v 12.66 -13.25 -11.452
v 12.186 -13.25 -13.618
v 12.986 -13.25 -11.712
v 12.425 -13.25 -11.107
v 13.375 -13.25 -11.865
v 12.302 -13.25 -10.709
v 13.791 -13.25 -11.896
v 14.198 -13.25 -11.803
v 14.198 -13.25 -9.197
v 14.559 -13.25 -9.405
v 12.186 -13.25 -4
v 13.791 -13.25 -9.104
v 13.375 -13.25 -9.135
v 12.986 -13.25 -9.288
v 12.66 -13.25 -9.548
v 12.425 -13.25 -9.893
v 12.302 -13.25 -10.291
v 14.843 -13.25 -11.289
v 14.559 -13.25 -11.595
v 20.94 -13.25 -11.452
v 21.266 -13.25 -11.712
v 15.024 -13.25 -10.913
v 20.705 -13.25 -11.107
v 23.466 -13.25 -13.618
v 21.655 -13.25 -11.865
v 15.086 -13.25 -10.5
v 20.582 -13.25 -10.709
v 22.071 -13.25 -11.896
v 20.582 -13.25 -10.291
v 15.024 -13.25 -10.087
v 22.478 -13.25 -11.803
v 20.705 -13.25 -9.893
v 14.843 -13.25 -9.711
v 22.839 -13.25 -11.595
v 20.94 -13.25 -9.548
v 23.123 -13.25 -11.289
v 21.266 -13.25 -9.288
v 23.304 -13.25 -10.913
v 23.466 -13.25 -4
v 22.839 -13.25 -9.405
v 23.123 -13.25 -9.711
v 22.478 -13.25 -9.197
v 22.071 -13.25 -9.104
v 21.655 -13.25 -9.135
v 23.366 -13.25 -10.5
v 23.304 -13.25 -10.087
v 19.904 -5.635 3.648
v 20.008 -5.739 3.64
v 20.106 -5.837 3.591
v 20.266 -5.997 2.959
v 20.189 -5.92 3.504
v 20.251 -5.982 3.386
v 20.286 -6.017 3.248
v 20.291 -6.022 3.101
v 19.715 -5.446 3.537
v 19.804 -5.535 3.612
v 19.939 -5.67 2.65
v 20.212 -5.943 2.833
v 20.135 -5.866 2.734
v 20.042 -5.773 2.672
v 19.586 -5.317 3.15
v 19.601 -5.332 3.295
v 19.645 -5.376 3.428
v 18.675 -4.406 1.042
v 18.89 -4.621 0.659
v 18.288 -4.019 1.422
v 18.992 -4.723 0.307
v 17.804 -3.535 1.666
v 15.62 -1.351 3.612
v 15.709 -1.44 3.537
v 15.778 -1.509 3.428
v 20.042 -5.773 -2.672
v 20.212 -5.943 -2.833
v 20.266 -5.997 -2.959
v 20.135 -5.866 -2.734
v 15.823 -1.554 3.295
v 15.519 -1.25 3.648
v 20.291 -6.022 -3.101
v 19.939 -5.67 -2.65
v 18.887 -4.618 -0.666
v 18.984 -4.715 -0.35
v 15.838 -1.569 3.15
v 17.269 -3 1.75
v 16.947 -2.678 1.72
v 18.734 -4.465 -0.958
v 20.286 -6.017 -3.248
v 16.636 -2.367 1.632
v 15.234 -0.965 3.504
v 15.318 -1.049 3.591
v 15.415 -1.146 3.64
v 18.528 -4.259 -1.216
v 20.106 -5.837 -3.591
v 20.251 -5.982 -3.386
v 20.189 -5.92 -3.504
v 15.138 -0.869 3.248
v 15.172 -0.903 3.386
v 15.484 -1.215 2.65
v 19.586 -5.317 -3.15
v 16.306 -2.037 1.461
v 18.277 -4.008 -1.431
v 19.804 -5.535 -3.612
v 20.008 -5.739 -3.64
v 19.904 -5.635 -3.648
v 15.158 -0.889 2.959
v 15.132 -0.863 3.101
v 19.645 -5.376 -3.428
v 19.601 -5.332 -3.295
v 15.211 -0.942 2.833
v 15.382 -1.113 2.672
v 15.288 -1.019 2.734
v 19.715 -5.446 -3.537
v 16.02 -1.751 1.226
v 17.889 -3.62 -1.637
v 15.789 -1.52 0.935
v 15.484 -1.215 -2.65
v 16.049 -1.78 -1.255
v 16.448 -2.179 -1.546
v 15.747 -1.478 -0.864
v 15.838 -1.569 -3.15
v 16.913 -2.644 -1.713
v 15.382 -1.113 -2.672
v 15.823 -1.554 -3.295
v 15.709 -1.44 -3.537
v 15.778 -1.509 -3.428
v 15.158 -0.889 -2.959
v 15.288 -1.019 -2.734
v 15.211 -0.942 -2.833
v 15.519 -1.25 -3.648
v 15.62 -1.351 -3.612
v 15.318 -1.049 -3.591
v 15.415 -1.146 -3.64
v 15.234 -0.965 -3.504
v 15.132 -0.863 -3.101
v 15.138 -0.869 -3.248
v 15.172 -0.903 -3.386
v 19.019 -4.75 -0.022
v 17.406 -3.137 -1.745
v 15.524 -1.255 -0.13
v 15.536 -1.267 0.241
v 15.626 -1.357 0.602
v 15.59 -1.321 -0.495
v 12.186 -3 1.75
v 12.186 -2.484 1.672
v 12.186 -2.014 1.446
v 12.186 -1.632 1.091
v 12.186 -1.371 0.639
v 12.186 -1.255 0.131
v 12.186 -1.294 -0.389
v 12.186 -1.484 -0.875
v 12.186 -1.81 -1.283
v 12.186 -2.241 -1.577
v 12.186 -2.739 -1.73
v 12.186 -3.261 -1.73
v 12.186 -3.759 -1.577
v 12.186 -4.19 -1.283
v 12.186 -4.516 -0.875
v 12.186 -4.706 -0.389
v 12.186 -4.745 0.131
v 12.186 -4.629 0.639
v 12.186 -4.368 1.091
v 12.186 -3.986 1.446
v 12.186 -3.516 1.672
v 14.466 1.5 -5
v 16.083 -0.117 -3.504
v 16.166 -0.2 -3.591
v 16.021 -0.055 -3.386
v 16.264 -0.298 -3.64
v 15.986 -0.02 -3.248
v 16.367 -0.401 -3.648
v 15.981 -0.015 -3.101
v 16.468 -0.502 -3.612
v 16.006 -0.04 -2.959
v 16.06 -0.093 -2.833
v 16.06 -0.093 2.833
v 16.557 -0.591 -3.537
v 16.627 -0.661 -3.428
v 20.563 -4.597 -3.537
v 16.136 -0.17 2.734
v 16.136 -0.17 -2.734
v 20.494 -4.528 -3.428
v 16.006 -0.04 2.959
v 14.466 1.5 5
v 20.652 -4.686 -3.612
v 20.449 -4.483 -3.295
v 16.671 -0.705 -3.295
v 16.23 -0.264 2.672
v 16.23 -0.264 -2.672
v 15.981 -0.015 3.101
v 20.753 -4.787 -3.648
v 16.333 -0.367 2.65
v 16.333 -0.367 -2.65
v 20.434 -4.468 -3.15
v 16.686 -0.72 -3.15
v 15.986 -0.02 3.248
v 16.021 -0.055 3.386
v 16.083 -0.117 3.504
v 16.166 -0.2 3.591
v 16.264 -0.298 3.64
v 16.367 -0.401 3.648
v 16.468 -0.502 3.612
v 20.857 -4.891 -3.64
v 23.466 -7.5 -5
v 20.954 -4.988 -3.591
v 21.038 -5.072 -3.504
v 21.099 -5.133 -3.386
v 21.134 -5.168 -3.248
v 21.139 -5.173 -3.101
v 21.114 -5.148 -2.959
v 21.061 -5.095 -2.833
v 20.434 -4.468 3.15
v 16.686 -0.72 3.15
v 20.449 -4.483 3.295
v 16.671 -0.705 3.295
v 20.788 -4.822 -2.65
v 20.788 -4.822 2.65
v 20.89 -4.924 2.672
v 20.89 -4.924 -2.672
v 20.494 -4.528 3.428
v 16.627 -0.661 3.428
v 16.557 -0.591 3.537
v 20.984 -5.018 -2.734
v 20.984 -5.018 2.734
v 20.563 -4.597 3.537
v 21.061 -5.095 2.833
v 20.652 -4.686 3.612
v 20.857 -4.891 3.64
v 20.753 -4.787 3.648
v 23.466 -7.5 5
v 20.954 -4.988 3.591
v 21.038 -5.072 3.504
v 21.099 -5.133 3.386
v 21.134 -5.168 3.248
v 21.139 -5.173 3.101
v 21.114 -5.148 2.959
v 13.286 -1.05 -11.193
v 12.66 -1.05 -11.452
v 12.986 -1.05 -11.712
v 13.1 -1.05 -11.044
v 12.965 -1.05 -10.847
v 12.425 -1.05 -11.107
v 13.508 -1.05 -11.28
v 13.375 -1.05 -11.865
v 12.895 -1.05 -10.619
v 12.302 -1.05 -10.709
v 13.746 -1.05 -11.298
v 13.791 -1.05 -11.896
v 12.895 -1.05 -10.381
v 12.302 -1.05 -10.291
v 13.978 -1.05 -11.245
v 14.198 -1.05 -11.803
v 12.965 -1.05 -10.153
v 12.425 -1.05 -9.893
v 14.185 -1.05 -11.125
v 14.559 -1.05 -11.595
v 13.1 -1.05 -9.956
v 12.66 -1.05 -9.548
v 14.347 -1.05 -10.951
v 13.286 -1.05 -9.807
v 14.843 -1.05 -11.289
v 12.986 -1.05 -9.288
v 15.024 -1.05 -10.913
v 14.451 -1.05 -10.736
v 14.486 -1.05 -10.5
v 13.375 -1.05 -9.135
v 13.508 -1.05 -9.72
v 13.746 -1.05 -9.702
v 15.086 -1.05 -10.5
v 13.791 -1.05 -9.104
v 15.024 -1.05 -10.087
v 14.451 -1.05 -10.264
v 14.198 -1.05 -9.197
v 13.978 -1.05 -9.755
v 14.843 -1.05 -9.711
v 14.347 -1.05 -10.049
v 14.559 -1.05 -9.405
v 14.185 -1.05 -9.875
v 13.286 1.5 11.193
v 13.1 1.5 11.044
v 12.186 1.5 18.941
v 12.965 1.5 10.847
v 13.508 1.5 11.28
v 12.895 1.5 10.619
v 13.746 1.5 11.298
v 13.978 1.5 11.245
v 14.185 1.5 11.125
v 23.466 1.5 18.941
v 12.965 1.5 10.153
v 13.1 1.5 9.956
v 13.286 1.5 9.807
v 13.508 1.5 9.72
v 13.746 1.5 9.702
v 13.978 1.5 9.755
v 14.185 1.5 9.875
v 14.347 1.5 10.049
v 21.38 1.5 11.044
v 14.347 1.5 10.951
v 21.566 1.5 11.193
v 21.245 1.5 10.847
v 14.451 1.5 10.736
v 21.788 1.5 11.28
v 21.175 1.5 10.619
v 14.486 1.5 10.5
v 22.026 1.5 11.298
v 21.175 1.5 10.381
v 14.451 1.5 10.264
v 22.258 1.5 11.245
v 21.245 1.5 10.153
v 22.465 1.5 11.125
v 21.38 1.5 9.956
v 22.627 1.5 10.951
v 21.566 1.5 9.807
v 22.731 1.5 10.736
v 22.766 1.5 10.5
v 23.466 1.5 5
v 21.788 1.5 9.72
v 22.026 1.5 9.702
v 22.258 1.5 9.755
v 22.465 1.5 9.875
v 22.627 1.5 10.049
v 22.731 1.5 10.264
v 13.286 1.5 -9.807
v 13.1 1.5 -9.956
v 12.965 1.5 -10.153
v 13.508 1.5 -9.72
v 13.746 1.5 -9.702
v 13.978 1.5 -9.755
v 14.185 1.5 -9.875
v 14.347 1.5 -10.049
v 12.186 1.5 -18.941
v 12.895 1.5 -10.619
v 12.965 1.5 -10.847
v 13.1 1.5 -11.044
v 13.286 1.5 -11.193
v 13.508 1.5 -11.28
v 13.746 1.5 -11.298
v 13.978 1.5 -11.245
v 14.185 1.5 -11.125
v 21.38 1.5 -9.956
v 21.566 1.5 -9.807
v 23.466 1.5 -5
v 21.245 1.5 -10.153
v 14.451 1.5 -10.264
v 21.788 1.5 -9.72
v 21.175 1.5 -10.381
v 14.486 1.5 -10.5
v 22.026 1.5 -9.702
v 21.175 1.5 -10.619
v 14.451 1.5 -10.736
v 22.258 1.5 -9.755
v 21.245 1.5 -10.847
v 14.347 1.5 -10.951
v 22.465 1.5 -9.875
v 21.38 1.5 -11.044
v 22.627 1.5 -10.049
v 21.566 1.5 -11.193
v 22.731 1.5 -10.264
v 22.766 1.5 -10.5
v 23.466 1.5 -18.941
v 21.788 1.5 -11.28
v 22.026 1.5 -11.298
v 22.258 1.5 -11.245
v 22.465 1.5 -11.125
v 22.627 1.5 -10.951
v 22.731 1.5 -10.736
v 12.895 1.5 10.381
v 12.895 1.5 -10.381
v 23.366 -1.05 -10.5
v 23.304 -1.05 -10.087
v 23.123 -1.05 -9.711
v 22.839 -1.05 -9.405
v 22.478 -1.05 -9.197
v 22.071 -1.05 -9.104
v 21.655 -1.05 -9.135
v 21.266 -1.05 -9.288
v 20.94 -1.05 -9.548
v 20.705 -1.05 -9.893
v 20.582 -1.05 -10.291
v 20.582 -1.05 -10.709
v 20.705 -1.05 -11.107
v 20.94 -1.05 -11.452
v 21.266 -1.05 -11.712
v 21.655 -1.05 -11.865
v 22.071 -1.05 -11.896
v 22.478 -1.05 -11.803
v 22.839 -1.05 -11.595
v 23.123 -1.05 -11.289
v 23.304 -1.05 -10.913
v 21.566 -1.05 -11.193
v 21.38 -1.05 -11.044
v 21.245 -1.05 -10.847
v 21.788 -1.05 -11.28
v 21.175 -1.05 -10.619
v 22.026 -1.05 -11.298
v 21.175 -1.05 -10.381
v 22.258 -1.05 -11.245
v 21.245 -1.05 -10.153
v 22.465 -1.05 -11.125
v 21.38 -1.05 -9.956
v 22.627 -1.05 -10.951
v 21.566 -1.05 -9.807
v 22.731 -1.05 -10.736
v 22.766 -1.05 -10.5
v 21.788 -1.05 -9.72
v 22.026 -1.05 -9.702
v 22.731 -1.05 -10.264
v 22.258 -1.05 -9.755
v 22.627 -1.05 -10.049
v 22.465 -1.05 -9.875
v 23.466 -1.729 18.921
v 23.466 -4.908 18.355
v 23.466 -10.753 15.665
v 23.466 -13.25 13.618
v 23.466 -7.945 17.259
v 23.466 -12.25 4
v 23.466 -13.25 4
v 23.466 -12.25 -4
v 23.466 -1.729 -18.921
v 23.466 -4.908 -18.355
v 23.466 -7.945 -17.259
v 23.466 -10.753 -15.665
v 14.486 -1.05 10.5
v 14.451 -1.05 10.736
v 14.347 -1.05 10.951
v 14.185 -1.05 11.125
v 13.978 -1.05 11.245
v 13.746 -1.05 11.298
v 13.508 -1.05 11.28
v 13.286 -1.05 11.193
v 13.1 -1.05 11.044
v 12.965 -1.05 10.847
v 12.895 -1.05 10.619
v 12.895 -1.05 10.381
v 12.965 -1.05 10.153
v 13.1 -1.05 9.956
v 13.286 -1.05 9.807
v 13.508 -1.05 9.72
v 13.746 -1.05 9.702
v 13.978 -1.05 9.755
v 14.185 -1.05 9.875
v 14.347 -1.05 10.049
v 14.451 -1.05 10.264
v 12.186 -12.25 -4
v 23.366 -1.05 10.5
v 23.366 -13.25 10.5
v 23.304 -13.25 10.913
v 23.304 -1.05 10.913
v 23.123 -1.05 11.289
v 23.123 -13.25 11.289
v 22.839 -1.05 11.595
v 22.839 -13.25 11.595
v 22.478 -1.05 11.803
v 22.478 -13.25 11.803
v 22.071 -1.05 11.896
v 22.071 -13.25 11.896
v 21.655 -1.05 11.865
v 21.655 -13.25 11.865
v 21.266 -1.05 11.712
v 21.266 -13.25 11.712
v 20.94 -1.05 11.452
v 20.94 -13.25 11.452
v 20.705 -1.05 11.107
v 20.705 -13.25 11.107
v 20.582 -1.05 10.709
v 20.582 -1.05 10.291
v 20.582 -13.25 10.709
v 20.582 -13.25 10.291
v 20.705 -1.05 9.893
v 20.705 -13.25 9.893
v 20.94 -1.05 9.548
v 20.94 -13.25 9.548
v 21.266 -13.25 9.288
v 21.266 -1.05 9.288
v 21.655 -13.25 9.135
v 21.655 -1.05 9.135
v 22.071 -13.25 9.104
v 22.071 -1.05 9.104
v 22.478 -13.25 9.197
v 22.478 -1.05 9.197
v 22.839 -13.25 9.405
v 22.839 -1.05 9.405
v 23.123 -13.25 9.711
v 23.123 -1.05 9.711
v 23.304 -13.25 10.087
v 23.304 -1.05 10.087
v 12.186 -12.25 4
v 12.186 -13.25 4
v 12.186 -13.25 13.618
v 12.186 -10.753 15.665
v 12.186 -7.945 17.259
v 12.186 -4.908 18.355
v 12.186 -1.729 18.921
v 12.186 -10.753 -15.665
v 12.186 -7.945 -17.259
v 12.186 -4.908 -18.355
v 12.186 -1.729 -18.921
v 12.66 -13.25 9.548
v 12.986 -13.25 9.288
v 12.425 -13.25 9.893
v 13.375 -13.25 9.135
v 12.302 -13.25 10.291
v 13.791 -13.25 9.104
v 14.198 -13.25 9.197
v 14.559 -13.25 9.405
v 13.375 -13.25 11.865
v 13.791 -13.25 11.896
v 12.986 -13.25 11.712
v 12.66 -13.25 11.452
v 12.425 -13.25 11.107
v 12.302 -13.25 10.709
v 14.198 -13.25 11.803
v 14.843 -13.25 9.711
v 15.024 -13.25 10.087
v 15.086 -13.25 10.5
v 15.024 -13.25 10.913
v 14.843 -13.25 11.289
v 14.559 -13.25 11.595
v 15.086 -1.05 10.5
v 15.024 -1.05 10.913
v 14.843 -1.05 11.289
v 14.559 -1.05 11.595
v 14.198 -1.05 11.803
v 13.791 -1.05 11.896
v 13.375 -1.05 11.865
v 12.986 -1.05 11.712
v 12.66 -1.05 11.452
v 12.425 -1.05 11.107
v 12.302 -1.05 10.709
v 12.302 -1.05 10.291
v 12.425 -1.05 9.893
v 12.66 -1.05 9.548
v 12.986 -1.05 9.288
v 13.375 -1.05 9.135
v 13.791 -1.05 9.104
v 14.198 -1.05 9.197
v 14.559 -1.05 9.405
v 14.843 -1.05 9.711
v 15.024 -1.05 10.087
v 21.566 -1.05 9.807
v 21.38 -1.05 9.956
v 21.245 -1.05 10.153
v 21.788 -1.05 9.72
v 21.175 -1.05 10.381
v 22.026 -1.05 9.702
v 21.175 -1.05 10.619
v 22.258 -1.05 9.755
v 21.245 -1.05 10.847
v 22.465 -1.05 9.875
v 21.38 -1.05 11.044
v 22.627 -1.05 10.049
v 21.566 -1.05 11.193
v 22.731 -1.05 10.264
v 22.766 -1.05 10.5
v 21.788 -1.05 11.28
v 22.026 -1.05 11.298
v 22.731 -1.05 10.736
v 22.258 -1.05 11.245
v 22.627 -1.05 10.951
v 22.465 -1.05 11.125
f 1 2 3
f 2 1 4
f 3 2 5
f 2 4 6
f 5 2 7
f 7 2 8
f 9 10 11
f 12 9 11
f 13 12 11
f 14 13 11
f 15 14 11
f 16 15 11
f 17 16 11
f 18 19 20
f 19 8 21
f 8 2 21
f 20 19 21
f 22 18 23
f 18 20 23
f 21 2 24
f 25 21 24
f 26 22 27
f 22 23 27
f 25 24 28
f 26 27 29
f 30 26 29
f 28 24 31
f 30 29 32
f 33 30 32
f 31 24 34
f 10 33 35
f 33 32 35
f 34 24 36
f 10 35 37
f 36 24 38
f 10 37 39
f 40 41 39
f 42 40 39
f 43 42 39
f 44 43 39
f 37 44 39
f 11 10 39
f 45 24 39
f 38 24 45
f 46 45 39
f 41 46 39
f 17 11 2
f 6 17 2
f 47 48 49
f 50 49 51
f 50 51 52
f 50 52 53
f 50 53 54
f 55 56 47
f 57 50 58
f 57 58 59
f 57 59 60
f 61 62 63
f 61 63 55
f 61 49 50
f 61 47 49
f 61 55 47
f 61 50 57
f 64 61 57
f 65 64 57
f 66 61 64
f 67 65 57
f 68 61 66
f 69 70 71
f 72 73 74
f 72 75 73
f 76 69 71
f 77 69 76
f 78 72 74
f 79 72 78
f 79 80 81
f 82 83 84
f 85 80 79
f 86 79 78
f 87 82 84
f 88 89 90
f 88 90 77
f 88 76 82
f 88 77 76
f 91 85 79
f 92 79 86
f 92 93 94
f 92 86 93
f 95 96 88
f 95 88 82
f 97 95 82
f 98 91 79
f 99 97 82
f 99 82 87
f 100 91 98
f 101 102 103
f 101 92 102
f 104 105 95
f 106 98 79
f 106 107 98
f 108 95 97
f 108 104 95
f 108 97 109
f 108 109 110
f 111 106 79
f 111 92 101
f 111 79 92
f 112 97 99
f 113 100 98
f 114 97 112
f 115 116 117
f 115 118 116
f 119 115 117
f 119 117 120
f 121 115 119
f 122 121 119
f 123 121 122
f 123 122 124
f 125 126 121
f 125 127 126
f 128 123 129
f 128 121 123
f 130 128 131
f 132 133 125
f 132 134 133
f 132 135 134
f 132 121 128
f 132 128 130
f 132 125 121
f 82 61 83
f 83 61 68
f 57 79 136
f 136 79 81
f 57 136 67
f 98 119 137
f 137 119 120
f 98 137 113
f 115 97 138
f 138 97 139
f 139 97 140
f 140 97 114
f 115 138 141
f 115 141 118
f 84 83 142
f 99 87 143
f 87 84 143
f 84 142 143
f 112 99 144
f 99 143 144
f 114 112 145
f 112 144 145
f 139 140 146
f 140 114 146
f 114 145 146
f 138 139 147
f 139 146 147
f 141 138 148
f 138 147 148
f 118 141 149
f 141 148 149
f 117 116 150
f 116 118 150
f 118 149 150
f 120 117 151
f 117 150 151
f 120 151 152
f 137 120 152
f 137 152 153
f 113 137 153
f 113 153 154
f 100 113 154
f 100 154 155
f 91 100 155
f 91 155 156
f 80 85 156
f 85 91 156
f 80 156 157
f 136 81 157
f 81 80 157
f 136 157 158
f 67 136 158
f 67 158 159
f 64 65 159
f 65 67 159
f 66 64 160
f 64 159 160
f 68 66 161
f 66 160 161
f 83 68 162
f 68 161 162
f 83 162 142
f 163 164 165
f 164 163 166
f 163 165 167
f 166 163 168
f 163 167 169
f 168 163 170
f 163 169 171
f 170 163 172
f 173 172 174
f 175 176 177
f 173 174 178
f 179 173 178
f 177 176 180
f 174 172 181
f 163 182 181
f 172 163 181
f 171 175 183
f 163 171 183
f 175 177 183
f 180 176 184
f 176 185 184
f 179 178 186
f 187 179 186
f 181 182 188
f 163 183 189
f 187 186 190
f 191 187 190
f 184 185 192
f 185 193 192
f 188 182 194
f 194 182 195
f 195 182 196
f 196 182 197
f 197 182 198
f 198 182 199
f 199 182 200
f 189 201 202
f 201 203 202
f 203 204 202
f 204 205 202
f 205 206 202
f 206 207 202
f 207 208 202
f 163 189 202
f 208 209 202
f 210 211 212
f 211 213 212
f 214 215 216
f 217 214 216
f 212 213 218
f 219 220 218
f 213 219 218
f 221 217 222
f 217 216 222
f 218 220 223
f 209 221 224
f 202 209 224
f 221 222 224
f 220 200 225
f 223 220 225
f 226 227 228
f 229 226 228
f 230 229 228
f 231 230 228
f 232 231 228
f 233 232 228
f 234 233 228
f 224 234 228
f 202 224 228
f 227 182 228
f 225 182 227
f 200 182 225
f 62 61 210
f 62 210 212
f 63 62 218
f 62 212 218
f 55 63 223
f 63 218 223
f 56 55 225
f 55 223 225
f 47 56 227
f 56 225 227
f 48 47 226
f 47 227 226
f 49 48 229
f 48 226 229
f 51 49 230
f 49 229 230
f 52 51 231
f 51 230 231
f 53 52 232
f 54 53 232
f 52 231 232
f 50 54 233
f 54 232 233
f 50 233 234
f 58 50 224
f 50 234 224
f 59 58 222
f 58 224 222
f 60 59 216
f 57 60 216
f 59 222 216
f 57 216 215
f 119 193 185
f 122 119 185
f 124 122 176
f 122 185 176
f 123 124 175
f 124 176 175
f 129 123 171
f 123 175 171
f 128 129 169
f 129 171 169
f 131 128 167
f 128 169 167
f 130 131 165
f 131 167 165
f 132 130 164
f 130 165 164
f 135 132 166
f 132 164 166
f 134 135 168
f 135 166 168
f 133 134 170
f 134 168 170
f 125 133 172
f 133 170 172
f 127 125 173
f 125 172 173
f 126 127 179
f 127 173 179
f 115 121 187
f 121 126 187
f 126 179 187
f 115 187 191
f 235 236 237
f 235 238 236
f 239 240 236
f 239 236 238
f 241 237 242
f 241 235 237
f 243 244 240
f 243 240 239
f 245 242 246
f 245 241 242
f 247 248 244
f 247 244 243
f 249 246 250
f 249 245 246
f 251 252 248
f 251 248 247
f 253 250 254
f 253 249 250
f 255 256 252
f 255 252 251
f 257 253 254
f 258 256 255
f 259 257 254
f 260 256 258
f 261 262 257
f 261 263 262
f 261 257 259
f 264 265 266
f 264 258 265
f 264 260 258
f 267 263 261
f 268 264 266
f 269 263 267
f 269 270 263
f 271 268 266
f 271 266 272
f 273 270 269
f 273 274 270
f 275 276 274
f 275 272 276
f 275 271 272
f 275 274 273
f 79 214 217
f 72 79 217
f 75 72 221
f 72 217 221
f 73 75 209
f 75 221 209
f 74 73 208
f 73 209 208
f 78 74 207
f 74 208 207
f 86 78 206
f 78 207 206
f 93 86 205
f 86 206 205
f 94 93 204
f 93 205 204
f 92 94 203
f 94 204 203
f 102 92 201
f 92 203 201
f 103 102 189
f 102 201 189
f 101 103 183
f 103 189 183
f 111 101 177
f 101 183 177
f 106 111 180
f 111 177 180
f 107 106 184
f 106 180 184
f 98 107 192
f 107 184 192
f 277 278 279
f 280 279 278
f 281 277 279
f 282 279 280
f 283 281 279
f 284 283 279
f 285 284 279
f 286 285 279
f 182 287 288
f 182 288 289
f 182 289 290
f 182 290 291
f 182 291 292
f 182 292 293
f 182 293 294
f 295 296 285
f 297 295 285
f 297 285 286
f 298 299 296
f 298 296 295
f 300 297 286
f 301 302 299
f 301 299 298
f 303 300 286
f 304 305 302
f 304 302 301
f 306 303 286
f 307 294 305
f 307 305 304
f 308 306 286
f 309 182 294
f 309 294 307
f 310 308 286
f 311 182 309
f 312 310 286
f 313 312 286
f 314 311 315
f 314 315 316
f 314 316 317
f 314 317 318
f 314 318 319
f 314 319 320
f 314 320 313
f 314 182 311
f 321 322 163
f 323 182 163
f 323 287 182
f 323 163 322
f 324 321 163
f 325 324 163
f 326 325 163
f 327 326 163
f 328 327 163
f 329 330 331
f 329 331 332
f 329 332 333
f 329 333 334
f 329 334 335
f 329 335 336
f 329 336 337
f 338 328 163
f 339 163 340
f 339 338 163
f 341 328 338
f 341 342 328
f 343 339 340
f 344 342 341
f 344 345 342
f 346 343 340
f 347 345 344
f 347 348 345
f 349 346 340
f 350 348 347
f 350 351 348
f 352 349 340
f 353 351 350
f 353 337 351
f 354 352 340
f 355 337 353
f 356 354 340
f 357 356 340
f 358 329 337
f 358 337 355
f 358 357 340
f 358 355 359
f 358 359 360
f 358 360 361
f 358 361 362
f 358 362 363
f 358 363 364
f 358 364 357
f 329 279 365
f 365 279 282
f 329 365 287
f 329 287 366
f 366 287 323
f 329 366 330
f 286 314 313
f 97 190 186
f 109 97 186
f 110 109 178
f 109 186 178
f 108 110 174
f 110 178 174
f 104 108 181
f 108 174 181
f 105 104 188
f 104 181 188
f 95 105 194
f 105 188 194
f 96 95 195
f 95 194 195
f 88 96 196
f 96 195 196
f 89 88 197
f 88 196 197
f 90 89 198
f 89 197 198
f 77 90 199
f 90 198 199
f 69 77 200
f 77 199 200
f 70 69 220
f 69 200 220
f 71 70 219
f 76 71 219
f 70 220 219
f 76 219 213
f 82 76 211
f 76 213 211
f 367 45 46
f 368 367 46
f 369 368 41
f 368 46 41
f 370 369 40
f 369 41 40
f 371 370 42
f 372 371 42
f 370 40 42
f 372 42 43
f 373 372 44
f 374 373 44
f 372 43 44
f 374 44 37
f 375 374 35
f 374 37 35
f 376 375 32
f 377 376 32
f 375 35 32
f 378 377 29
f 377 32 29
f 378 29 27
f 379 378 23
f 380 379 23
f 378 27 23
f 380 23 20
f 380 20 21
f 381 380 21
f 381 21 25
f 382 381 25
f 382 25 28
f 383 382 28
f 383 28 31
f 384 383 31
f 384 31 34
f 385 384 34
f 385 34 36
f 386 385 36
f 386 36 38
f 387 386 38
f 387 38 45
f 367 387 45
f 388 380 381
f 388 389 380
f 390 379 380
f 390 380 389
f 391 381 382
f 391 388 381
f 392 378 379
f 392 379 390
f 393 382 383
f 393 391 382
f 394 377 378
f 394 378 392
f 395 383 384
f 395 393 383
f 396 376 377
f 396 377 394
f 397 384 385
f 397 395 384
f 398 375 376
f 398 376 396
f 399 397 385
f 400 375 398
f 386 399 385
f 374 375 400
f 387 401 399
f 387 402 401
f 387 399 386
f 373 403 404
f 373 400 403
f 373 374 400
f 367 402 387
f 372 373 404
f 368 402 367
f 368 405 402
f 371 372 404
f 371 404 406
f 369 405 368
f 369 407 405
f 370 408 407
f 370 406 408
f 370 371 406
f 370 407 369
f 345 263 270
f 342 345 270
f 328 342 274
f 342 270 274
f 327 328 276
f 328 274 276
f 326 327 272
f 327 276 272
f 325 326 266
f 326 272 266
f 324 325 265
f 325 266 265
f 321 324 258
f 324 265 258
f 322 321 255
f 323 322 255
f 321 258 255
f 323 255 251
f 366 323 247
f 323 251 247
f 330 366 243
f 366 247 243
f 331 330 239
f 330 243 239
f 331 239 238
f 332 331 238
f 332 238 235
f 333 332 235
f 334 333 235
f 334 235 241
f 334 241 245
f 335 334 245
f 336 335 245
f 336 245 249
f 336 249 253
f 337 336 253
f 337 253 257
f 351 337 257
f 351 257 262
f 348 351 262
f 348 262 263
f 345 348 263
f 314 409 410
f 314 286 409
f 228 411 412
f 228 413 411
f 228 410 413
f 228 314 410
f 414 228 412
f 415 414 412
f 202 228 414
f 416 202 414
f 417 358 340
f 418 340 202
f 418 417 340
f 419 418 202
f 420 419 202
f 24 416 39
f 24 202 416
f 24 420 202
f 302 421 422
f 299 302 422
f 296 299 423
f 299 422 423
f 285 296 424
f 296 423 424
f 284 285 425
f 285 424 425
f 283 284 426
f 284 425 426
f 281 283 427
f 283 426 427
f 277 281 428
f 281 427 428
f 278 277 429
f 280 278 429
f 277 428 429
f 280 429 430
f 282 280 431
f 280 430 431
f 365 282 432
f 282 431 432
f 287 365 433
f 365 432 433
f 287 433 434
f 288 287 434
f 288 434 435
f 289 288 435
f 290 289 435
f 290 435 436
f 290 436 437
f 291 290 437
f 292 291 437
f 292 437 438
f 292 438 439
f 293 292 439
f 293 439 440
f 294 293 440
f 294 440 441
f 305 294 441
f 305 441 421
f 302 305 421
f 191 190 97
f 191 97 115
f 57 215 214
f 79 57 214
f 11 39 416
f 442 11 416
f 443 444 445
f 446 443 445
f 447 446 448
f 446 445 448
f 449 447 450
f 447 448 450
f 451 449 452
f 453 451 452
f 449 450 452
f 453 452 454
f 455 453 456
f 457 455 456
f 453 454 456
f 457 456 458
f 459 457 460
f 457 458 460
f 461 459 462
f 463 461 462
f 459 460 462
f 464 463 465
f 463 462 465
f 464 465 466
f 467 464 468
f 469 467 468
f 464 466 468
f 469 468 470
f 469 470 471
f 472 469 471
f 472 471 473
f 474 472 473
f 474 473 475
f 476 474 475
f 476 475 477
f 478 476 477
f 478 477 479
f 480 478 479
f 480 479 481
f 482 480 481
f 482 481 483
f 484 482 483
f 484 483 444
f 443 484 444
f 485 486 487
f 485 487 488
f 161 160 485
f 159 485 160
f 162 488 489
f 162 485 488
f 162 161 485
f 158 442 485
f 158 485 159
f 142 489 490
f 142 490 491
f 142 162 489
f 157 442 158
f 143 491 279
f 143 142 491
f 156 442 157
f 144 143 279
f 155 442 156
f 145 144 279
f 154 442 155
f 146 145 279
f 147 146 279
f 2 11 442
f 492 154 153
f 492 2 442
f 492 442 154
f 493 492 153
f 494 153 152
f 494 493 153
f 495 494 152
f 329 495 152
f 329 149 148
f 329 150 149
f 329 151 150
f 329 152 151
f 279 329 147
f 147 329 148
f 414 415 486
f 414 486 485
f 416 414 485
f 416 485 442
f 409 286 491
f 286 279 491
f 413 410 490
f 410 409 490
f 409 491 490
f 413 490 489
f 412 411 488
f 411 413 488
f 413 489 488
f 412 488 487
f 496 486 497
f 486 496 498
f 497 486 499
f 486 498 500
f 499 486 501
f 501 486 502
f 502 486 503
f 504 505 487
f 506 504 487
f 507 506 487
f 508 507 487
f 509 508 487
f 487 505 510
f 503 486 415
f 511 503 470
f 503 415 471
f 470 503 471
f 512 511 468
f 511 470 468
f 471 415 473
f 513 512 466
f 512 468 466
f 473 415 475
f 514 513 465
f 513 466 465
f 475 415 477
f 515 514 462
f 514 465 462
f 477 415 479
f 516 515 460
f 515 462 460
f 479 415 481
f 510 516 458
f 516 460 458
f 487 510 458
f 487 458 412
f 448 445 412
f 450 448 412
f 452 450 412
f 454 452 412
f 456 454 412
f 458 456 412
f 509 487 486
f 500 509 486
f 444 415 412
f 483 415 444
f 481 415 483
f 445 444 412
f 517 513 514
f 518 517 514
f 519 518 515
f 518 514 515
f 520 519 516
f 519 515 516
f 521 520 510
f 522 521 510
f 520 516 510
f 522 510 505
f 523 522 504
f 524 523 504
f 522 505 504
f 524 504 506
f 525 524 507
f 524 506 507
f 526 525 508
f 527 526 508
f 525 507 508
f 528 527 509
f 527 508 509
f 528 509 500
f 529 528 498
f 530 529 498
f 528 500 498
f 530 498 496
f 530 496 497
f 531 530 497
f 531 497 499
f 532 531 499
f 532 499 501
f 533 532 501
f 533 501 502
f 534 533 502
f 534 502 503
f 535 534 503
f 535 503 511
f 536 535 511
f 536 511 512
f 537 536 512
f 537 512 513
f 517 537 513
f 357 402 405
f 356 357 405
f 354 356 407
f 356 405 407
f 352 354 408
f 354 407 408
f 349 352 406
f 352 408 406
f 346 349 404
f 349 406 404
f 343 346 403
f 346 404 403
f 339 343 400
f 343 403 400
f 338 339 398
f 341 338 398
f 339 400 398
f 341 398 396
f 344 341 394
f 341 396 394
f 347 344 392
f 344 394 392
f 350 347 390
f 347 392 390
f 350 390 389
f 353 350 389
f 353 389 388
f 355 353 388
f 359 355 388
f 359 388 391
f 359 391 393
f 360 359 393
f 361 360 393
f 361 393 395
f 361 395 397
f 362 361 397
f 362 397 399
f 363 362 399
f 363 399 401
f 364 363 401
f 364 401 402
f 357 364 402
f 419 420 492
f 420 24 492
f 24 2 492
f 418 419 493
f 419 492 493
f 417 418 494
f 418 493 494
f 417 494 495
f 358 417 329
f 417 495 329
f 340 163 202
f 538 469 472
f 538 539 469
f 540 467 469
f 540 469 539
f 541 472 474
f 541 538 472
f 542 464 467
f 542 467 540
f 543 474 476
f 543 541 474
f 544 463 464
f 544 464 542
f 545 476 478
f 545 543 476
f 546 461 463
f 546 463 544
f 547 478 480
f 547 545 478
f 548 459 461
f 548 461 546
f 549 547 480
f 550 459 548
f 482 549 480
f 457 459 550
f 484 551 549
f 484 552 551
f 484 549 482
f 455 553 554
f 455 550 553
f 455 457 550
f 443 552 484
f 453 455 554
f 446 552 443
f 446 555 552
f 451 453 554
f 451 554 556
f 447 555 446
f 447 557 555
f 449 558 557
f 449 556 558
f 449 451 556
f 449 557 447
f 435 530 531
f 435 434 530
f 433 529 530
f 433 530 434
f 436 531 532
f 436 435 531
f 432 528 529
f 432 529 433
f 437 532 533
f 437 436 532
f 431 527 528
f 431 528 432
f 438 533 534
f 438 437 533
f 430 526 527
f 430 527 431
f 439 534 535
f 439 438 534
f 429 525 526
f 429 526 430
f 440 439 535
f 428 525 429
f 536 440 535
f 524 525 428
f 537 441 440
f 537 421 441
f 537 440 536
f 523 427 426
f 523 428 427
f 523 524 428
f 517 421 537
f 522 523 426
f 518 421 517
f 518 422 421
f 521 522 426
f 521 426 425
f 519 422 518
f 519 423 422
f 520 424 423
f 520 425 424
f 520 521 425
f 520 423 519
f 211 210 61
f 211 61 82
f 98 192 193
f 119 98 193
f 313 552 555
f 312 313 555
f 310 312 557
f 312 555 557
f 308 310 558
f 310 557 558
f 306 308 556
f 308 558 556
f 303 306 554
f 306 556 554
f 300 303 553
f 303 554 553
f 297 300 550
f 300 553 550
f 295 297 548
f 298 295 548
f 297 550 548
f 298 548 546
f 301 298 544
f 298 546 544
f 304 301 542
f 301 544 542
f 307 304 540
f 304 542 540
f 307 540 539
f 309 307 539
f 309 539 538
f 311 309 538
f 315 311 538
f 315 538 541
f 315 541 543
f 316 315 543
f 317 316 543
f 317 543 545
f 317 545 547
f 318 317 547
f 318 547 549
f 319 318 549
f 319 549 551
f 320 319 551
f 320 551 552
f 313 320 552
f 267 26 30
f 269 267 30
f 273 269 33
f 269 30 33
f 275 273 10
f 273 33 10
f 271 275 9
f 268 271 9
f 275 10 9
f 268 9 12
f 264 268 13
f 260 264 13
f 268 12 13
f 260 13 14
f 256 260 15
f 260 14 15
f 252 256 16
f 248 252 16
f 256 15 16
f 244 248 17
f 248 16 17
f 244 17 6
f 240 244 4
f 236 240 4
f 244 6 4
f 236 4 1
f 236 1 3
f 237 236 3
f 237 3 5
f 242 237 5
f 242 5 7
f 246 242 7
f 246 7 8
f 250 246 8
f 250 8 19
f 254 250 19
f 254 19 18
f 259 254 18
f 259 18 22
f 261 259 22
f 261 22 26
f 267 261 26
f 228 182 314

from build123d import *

# Parameters (mm, degrees)
SKETCH_1_R                = 19
EXTRUDE_1_DEPTH           = 40
CUT_EXTRUDE_1_DEPTH       = 49.187135213
CUT_EXTRUDE_1_DEPTH_BACK  = 49.187135213
SKETCH_2_OUTSIDE_W        = 55.398
SKETCH_2_OUTSIDE_H        = 53.398
SKETCH_3_R                = 1.75
CUT_EXTRUDE_2_DEPTH       = 7.4
CUT_EXTRUDE_4_DEPTH       = 5
SKETCH_6_W                = 6.3
SKETCH_6_H                = 6.3
CUT_EXTRUDE_5_DEPTH       = 1.2
SKETCH_10_R               = 1.4
CUT_EXTRUDE_8_DEPTH       = 13.7
CUT_EXTRUDE_9_REACH       = 35.156
SKETCH_11_R               = 0.8
SKETCH_12_W               = 8
SKETCH_12_H               = 2.5
CUT_EXTRUDE_10_DEPTH      = 27.566913633
SKETCH_13_R               = 0.5
CUT_EXTRUDE_11_DEPTH      = 1.2
CUT_EXTRUDE_12_DEPTH      = 27.566913633
CUT_EXTRUDE_12_DEPTH_BACK = 27.566913633
SKETCH_14_W               = 31.188232258
SKETCH_14_H               = 3.19353307


with BuildPart() as part:
    # 草图1 → 凸台-拉伸1 (new body)
    with BuildSketch(Plane(origin=(0, 0, 0), x_dir=(0, 0, -1), z_dir=(1, 0, 0))):
        Circle(SKETCH_1_R)
    extrude(amount=EXTRUDE_1_DEPTH)

    # 草图2 outside → 切除-拉伸1 (cut, two sides: drawn at the far end of the back side and taken through both)
    with BuildSketch(Plane.XY.offset(-CUT_EXTRUDE_1_DEPTH_BACK)):
        with Locations((20, 0)):
            Rectangle(SKETCH_2_OUTSIDE_W, SKETCH_2_OUTSIDE_H)
        Polygon((12.186055083, 1.5), (14.466055083, 1.5), (23.466055083, 1.5), (23.466055083, -7.5), (23.466055083, -14.75), (12.186055083, -14.75), align=None, mode=Mode.SUBTRACT)
    extrude(amount=CUT_EXTRUDE_1_DEPTH + CUT_EXTRUDE_1_DEPTH_BACK, mode=Mode.SUBTRACT)

    # 草图3 → 切除-拉伸2 (cut)
    with BuildSketch(Plane.ZY.offset(-12.186055083)):
        with Locations((0, -3)):
            Circle(SKETCH_3_R)
    extrude(amount=-CUT_EXTRUDE_2_DEPTH, mode=Mode.SUBTRACT)

    # 草图5 → 切除-拉伸4 (cut, symmetric)
    with BuildSketch(Plane.XY):
        Polygon((14.466055083, 1.5), (23.466055083, -7.5), (23.466055083, 1.5), align=None)
    extrude(amount=CUT_EXTRUDE_4_DEPTH, both=True, mode=Mode.SUBTRACT)

    # 草图6 → 切除-拉伸5 (cut)
    with BuildSketch(Plane(origin=(7.983027542, 7.983027542, 0), x_dir=(0, 0, -1), z_dir=(0.7071067811865487, 0.7071067811865465, 0))):
        with Locations((0, -14.958385475)):
            Rectangle(SKETCH_6_W, SKETCH_6_H)
    extrude(amount=-CUT_EXTRUDE_5_DEPTH, mode=Mode.SUBTRACT)

    # 草图10 → 切除-拉伸8 (cut)
    with BuildSketch(Plane.XZ.offset(14.75)):
        with Locations((13.686055083, 10.5)):
            Circle(SKETCH_10_R)
        with Locations((21.966055083, 10.5)):
            Circle(SKETCH_10_R)
        with Locations((13.686055083, -10.5)):
            Circle(SKETCH_10_R)
        with Locations((21.966055083, -10.5)):
            Circle(SKETCH_10_R)
    extrude(amount=-CUT_EXTRUDE_8_DEPTH, mode=Mode.SUBTRACT)

    # 草图11 → 切除-拉伸9 (cut, up to next)
    with BuildSketch(Plane.XZ.offset(1.05), mode=Mode.PRIVATE) as cut_extrude_9_sk1:
        with Locations((13.686055083, 10.5)):
            Circle(SKETCH_11_R)
    cut_extrude_9_tool1 = extrude(cut_extrude_9_sk1.sketch, amount=-CUT_EXTRUDE_9_REACH, mode=Mode.PRIVATE) & part.part
    # 草图11 → 切除-拉伸9 (cut, up to next)
    with BuildSketch(Plane.XZ.offset(1.05), mode=Mode.PRIVATE) as cut_extrude_9_sk2:
        with Locations((21.966055083, 10.5)):
            Circle(SKETCH_11_R)
    cut_extrude_9_tool2 = extrude(cut_extrude_9_sk2.sketch, amount=-CUT_EXTRUDE_9_REACH, mode=Mode.PRIVATE) & part.part
    # 草图11 → 切除-拉伸9 (cut, up to next)
    with BuildSketch(Plane.XZ.offset(1.05), mode=Mode.PRIVATE) as cut_extrude_9_sk3:
        with Locations((13.686055083, -10.5)):
            Circle(SKETCH_11_R)
    cut_extrude_9_tool3 = extrude(cut_extrude_9_sk3.sketch, amount=-CUT_EXTRUDE_9_REACH, mode=Mode.PRIVATE) & part.part
    # 草图11 → 切除-拉伸9 (cut, up to next)
    with BuildSketch(Plane.XZ.offset(1.05), mode=Mode.PRIVATE) as cut_extrude_9_sk4:
        with Locations((21.966055083, -10.5)):
            Circle(SKETCH_11_R)
    cut_extrude_9_tool4 = extrude(cut_extrude_9_sk4.sketch, amount=-CUT_EXTRUDE_9_REACH, mode=Mode.PRIVATE) & part.part
    add(cut_extrude_9_tool1.solids().sort_by_distance((13.686055, -1.05, 10.5))[0], mode=Mode.SUBTRACT)
    add(cut_extrude_9_tool2.solids().sort_by_distance((21.966055, -1.05, 10.5))[0], mode=Mode.SUBTRACT)
    add(cut_extrude_9_tool3.solids().sort_by_distance((13.686055, -1.05, -10.5))[0], mode=Mode.SUBTRACT)
    add(cut_extrude_9_tool4.solids().sort_by_distance((21.966055, -1.05, -10.5))[0], mode=Mode.SUBTRACT)

    # 草图12 → 切除-拉伸10 (cut, through all)
    with BuildSketch(Plane(origin=(23.466055083, 0, 0), x_dir=(0, 0, -1), z_dir=(1, 0, 0))):
        with Locations((0, -13.5)):
            Rectangle(SKETCH_12_W, SKETCH_12_H)
    extrude(amount=-CUT_EXTRUDE_10_DEPTH, mode=Mode.SUBTRACT)

    # 草图13 → 切除-拉伸11 (cut)
    with BuildSketch(Plane(origin=(7.983027542, 7.983027542, 0), x_dir=(0, 0, -1), z_dir=(0.7071067811865487, 0.7071067811865465, 0))):
        with Locations((-3.15, -11.808385475)):
            Circle(SKETCH_13_R)
        with Locations((3.15, -11.808385475)):
            Circle(SKETCH_13_R)
        with Locations((-3.15, -18.108385475)):
            Circle(SKETCH_13_R)
        with Locations((3.15, -18.108385475)):
            Circle(SKETCH_13_R)
    extrude(amount=-CUT_EXTRUDE_11_DEPTH, mode=Mode.SUBTRACT)

    # 草图14 → 切除-拉伸12 (cut, two sides: drawn at the far end of the back side and taken through both)
    with BuildSketch(Plane.ZY.offset(-12.186055083).offset(-CUT_EXTRUDE_12_DEPTH_BACK)):
        with Locations((-0.125755843, -14.846766535)):
            Rectangle(SKETCH_14_W, SKETCH_14_H)
    extrude(amount=CUT_EXTRUDE_12_DEPTH + CUT_EXTRUDE_12_DEPTH_BACK, mode=Mode.SUBTRACT)


solid = part.part
